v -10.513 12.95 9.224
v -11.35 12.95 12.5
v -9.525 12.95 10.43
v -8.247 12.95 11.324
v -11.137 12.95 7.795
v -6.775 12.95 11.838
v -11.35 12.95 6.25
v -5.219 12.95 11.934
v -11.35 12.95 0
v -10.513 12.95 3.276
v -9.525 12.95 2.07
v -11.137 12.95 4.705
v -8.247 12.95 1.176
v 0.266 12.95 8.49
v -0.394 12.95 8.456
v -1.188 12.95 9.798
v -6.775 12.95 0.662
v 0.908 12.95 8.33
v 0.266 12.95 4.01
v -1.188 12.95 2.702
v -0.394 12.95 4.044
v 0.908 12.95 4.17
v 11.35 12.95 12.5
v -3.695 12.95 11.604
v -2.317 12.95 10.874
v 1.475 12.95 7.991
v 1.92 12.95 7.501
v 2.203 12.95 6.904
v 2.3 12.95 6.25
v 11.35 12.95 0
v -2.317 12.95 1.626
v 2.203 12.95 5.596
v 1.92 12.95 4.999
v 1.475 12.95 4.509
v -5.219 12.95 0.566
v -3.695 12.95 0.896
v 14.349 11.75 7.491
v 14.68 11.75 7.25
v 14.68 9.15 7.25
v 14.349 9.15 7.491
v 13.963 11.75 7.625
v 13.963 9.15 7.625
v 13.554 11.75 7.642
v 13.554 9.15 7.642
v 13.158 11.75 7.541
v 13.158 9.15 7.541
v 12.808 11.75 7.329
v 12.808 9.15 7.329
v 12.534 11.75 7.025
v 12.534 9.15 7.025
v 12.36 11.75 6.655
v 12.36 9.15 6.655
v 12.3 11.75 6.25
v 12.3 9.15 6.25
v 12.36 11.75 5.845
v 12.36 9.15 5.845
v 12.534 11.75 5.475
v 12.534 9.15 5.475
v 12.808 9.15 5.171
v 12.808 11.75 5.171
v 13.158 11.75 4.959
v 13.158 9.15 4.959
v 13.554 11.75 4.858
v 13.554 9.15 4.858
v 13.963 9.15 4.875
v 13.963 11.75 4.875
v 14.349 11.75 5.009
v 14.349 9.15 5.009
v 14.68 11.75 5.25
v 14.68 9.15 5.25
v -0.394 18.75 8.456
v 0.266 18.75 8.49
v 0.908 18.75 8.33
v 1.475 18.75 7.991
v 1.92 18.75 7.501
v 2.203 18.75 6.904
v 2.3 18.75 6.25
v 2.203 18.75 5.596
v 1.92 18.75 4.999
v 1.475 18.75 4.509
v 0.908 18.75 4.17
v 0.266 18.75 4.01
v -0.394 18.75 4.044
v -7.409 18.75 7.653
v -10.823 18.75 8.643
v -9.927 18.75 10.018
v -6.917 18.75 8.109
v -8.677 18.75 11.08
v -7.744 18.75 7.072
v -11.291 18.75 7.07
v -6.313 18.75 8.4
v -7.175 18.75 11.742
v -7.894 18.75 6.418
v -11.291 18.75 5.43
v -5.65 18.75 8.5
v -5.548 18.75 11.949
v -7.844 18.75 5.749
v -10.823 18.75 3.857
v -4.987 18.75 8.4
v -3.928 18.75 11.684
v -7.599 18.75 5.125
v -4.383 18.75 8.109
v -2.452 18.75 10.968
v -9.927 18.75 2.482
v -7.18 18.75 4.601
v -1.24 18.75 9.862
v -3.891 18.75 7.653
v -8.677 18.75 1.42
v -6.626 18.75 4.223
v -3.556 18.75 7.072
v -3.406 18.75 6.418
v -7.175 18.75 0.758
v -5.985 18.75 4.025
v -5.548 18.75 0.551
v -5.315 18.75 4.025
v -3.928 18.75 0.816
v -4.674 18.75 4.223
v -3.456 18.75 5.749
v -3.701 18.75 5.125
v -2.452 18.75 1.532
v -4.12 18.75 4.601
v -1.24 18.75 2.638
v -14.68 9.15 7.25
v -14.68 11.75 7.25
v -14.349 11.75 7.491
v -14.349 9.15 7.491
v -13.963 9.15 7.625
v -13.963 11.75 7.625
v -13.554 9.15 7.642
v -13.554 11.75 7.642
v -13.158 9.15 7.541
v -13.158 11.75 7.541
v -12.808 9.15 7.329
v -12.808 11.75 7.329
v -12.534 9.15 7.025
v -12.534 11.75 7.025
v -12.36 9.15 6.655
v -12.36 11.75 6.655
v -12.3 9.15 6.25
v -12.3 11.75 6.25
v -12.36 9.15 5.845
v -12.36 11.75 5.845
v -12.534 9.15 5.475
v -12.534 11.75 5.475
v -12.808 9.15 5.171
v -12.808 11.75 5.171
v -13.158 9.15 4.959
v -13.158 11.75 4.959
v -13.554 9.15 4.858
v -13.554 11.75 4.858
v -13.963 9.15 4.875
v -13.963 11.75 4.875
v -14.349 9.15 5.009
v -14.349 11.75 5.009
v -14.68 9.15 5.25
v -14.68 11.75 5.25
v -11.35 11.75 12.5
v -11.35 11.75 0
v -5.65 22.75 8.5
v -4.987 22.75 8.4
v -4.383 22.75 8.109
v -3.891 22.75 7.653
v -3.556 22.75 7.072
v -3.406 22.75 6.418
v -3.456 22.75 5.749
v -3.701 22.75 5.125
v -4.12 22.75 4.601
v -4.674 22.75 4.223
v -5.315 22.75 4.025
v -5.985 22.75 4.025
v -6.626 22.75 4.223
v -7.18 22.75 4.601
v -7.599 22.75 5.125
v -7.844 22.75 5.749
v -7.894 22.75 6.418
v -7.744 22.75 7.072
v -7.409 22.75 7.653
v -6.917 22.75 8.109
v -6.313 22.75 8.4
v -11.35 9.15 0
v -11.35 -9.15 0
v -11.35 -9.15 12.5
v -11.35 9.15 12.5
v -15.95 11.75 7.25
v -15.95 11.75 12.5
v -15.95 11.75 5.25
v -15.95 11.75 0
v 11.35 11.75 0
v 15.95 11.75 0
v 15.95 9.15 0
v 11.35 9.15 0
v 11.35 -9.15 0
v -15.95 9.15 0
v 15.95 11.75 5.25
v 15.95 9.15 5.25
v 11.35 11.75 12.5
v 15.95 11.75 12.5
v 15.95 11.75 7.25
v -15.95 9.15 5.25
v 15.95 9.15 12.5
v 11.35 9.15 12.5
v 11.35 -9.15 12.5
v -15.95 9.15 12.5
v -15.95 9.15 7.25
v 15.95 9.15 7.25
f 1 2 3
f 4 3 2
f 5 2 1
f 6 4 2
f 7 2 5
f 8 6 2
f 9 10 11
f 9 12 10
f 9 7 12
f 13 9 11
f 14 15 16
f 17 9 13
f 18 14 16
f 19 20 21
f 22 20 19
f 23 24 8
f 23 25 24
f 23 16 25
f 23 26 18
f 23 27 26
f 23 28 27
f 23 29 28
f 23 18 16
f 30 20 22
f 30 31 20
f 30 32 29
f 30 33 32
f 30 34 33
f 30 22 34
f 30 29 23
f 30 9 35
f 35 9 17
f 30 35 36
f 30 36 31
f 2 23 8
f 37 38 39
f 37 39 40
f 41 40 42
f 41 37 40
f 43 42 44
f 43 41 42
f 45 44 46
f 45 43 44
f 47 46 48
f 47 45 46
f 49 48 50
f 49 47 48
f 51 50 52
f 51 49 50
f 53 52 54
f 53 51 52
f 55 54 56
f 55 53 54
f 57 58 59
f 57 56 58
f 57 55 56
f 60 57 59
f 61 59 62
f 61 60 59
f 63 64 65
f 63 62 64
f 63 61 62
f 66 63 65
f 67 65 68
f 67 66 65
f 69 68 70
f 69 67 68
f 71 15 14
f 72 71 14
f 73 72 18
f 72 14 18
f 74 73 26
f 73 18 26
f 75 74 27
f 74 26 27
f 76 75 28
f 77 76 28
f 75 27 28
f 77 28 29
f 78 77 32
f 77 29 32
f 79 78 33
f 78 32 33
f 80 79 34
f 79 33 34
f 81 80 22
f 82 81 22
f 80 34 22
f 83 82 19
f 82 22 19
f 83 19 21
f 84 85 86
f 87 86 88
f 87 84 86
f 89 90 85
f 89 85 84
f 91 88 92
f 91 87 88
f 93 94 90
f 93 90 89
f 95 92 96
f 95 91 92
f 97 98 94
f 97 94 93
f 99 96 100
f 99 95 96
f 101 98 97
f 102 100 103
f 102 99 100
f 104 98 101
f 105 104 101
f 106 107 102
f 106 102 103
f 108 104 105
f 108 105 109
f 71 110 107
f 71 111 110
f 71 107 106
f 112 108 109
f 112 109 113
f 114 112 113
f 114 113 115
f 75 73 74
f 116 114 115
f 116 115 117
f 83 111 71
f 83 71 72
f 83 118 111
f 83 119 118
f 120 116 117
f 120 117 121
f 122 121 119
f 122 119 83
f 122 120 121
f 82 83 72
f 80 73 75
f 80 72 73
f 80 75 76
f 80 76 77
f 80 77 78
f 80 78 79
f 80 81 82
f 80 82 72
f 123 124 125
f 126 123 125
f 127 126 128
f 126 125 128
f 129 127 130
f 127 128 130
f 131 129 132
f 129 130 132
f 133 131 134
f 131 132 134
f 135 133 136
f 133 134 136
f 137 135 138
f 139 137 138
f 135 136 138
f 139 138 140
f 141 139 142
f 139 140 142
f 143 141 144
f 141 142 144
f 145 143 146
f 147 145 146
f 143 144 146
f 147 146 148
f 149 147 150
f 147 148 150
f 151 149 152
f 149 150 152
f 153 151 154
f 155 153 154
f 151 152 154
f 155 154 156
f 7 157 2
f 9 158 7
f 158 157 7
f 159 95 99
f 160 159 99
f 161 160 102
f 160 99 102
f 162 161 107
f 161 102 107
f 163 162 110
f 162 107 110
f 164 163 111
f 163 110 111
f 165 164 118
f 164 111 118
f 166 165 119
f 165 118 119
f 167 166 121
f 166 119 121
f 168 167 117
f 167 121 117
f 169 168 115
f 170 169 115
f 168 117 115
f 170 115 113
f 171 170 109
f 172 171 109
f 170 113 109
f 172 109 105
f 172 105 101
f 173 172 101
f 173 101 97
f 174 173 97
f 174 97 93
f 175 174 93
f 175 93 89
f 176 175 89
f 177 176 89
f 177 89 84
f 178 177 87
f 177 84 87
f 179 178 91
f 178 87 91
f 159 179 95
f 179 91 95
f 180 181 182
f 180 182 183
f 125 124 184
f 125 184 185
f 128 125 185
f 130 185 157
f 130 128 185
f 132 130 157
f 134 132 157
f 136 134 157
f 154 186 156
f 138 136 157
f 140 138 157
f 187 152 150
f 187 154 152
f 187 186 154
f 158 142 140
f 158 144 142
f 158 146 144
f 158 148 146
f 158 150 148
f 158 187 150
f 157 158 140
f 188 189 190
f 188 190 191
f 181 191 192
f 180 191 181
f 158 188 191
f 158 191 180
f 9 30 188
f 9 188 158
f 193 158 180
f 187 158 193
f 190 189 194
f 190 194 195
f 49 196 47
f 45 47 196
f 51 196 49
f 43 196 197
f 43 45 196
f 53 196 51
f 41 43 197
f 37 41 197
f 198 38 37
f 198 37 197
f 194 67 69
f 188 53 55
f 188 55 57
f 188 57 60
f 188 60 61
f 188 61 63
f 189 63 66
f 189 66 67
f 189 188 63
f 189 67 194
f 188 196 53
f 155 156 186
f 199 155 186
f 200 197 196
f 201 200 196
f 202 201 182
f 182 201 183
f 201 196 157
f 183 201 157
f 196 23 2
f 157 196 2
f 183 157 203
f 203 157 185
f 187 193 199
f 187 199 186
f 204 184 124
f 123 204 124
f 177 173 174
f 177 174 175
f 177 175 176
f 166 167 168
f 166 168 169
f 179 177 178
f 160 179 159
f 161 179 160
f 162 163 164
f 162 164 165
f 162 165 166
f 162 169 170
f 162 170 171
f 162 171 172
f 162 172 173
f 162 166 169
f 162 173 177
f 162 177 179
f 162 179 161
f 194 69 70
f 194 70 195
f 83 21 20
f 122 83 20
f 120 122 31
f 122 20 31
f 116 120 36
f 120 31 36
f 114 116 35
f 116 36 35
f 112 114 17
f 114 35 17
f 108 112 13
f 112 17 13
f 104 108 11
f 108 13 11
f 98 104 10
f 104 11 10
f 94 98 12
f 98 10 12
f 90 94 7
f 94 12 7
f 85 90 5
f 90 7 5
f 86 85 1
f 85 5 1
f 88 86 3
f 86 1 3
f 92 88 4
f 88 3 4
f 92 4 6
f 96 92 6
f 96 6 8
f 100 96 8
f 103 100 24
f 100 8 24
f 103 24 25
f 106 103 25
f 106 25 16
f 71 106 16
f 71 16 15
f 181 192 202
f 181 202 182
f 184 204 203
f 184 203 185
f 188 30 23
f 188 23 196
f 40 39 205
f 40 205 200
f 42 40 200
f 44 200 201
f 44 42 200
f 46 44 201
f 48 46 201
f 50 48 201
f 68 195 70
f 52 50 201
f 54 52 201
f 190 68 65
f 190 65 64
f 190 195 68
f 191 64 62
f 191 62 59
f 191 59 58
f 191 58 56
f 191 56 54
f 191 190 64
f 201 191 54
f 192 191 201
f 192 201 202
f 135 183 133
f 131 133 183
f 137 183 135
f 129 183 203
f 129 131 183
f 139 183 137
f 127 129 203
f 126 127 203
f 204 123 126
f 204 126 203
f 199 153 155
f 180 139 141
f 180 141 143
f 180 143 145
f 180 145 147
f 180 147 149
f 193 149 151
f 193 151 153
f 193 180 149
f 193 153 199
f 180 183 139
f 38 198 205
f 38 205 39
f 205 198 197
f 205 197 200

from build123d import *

# Parameters (mm, degrees)
RESSALTO_EXTRUS_O1_DEPTH = 12.5
RESSALTO_EXTRUS_O2_DEPTH = 5.8
CORTE_EXTRUS_O1_DEPTH    = 5.5
ESBO_O4_R                = 2.25
RESSALTO_EXTRUS_O3_DEPTH = 4


with BuildPart() as part:
    # Esboço1 → Ressalto-extrusão1 (new body)
    with BuildSketch(Plane.XY):
        Polygon((11.35, 11.75), (15.95, 11.75), (15.95, 9.15), (11.35, 9.15), (11.35, -9.15), (-11.35, -9.15), (-11.35, 9.15), (-15.95, 9.15), (-15.95, 11.75), (-11.35, 11.75), (-11.35, 12.95), (11.35, 12.95), align=None)
    extrude(amount=RESSALTO_EXTRUS_O1_DEPTH)

    # Esboço2 → Ressalto-extrusão2 (add)
    with BuildSketch(Plane(origin=(0, 12.95, 0), x_dir=(1, 0, 0), z_dir=(0, 1, 0))):
        with BuildLine():
            ThreePointArc((-0.394078947, -4.04425888), (-11.35, -6.25), (-0.394078947, -8.45574112))
            ThreePointArc((-0.394078947, -8.45574112), (2.3, -6.25), (-0.394078947, -4.04425888))
        make_face()
    extrude(amount=RESSALTO_EXTRUS_O2_DEPTH)

    # Esboço3 → Corte-extrusão1 (cut)
    with BuildSketch(Plane(origin=(0, 11.75, 0), x_dir=(1, 0, 0), z_dir=(0, 1, 0))):
        with BuildLine():
            Line((-15.95, -7.25), (-14.679795897, -7.25))
            ThreePointArc((-14.679795897, -7.25), (-12.3, -6.25), (-14.679795897, -5.25))
            Line((-14.679795897, -5.25), (-15.95, -5.25))
            Line((-15.95, -5.25), (-15.95, -7.25))
        make_face()
        with BuildLine():
            Line((15.95, -5.25), (15.95, -7.25))
            Line((15.95, -7.25), (14.679795897, -7.25))
            ThreePointArc((14.679795897, -7.25), (12.3, -6.25), (14.679795897, -5.25))
            Line((14.679795897, -5.25), (15.95, -5.25))
        make_face()
    extrude(amount=-CORTE_EXTRUS_O1_DEPTH, mode=Mode.SUBTRACT)

    # Esboço4 → Ressalto-extrusão3 (add)
    with BuildSketch(Plane(origin=(0, 18.75, 0), x_dir=(1, 0, 0), z_dir=(0, 1, 0))):
        with Locations(Location((-5.65, -6.25, 0), (0, 0, 270))):
            Circle(ESBO_O4_R)
    extrude(amount=RESSALTO_EXTRUS_O3_DEPTH)


solid = part.part
